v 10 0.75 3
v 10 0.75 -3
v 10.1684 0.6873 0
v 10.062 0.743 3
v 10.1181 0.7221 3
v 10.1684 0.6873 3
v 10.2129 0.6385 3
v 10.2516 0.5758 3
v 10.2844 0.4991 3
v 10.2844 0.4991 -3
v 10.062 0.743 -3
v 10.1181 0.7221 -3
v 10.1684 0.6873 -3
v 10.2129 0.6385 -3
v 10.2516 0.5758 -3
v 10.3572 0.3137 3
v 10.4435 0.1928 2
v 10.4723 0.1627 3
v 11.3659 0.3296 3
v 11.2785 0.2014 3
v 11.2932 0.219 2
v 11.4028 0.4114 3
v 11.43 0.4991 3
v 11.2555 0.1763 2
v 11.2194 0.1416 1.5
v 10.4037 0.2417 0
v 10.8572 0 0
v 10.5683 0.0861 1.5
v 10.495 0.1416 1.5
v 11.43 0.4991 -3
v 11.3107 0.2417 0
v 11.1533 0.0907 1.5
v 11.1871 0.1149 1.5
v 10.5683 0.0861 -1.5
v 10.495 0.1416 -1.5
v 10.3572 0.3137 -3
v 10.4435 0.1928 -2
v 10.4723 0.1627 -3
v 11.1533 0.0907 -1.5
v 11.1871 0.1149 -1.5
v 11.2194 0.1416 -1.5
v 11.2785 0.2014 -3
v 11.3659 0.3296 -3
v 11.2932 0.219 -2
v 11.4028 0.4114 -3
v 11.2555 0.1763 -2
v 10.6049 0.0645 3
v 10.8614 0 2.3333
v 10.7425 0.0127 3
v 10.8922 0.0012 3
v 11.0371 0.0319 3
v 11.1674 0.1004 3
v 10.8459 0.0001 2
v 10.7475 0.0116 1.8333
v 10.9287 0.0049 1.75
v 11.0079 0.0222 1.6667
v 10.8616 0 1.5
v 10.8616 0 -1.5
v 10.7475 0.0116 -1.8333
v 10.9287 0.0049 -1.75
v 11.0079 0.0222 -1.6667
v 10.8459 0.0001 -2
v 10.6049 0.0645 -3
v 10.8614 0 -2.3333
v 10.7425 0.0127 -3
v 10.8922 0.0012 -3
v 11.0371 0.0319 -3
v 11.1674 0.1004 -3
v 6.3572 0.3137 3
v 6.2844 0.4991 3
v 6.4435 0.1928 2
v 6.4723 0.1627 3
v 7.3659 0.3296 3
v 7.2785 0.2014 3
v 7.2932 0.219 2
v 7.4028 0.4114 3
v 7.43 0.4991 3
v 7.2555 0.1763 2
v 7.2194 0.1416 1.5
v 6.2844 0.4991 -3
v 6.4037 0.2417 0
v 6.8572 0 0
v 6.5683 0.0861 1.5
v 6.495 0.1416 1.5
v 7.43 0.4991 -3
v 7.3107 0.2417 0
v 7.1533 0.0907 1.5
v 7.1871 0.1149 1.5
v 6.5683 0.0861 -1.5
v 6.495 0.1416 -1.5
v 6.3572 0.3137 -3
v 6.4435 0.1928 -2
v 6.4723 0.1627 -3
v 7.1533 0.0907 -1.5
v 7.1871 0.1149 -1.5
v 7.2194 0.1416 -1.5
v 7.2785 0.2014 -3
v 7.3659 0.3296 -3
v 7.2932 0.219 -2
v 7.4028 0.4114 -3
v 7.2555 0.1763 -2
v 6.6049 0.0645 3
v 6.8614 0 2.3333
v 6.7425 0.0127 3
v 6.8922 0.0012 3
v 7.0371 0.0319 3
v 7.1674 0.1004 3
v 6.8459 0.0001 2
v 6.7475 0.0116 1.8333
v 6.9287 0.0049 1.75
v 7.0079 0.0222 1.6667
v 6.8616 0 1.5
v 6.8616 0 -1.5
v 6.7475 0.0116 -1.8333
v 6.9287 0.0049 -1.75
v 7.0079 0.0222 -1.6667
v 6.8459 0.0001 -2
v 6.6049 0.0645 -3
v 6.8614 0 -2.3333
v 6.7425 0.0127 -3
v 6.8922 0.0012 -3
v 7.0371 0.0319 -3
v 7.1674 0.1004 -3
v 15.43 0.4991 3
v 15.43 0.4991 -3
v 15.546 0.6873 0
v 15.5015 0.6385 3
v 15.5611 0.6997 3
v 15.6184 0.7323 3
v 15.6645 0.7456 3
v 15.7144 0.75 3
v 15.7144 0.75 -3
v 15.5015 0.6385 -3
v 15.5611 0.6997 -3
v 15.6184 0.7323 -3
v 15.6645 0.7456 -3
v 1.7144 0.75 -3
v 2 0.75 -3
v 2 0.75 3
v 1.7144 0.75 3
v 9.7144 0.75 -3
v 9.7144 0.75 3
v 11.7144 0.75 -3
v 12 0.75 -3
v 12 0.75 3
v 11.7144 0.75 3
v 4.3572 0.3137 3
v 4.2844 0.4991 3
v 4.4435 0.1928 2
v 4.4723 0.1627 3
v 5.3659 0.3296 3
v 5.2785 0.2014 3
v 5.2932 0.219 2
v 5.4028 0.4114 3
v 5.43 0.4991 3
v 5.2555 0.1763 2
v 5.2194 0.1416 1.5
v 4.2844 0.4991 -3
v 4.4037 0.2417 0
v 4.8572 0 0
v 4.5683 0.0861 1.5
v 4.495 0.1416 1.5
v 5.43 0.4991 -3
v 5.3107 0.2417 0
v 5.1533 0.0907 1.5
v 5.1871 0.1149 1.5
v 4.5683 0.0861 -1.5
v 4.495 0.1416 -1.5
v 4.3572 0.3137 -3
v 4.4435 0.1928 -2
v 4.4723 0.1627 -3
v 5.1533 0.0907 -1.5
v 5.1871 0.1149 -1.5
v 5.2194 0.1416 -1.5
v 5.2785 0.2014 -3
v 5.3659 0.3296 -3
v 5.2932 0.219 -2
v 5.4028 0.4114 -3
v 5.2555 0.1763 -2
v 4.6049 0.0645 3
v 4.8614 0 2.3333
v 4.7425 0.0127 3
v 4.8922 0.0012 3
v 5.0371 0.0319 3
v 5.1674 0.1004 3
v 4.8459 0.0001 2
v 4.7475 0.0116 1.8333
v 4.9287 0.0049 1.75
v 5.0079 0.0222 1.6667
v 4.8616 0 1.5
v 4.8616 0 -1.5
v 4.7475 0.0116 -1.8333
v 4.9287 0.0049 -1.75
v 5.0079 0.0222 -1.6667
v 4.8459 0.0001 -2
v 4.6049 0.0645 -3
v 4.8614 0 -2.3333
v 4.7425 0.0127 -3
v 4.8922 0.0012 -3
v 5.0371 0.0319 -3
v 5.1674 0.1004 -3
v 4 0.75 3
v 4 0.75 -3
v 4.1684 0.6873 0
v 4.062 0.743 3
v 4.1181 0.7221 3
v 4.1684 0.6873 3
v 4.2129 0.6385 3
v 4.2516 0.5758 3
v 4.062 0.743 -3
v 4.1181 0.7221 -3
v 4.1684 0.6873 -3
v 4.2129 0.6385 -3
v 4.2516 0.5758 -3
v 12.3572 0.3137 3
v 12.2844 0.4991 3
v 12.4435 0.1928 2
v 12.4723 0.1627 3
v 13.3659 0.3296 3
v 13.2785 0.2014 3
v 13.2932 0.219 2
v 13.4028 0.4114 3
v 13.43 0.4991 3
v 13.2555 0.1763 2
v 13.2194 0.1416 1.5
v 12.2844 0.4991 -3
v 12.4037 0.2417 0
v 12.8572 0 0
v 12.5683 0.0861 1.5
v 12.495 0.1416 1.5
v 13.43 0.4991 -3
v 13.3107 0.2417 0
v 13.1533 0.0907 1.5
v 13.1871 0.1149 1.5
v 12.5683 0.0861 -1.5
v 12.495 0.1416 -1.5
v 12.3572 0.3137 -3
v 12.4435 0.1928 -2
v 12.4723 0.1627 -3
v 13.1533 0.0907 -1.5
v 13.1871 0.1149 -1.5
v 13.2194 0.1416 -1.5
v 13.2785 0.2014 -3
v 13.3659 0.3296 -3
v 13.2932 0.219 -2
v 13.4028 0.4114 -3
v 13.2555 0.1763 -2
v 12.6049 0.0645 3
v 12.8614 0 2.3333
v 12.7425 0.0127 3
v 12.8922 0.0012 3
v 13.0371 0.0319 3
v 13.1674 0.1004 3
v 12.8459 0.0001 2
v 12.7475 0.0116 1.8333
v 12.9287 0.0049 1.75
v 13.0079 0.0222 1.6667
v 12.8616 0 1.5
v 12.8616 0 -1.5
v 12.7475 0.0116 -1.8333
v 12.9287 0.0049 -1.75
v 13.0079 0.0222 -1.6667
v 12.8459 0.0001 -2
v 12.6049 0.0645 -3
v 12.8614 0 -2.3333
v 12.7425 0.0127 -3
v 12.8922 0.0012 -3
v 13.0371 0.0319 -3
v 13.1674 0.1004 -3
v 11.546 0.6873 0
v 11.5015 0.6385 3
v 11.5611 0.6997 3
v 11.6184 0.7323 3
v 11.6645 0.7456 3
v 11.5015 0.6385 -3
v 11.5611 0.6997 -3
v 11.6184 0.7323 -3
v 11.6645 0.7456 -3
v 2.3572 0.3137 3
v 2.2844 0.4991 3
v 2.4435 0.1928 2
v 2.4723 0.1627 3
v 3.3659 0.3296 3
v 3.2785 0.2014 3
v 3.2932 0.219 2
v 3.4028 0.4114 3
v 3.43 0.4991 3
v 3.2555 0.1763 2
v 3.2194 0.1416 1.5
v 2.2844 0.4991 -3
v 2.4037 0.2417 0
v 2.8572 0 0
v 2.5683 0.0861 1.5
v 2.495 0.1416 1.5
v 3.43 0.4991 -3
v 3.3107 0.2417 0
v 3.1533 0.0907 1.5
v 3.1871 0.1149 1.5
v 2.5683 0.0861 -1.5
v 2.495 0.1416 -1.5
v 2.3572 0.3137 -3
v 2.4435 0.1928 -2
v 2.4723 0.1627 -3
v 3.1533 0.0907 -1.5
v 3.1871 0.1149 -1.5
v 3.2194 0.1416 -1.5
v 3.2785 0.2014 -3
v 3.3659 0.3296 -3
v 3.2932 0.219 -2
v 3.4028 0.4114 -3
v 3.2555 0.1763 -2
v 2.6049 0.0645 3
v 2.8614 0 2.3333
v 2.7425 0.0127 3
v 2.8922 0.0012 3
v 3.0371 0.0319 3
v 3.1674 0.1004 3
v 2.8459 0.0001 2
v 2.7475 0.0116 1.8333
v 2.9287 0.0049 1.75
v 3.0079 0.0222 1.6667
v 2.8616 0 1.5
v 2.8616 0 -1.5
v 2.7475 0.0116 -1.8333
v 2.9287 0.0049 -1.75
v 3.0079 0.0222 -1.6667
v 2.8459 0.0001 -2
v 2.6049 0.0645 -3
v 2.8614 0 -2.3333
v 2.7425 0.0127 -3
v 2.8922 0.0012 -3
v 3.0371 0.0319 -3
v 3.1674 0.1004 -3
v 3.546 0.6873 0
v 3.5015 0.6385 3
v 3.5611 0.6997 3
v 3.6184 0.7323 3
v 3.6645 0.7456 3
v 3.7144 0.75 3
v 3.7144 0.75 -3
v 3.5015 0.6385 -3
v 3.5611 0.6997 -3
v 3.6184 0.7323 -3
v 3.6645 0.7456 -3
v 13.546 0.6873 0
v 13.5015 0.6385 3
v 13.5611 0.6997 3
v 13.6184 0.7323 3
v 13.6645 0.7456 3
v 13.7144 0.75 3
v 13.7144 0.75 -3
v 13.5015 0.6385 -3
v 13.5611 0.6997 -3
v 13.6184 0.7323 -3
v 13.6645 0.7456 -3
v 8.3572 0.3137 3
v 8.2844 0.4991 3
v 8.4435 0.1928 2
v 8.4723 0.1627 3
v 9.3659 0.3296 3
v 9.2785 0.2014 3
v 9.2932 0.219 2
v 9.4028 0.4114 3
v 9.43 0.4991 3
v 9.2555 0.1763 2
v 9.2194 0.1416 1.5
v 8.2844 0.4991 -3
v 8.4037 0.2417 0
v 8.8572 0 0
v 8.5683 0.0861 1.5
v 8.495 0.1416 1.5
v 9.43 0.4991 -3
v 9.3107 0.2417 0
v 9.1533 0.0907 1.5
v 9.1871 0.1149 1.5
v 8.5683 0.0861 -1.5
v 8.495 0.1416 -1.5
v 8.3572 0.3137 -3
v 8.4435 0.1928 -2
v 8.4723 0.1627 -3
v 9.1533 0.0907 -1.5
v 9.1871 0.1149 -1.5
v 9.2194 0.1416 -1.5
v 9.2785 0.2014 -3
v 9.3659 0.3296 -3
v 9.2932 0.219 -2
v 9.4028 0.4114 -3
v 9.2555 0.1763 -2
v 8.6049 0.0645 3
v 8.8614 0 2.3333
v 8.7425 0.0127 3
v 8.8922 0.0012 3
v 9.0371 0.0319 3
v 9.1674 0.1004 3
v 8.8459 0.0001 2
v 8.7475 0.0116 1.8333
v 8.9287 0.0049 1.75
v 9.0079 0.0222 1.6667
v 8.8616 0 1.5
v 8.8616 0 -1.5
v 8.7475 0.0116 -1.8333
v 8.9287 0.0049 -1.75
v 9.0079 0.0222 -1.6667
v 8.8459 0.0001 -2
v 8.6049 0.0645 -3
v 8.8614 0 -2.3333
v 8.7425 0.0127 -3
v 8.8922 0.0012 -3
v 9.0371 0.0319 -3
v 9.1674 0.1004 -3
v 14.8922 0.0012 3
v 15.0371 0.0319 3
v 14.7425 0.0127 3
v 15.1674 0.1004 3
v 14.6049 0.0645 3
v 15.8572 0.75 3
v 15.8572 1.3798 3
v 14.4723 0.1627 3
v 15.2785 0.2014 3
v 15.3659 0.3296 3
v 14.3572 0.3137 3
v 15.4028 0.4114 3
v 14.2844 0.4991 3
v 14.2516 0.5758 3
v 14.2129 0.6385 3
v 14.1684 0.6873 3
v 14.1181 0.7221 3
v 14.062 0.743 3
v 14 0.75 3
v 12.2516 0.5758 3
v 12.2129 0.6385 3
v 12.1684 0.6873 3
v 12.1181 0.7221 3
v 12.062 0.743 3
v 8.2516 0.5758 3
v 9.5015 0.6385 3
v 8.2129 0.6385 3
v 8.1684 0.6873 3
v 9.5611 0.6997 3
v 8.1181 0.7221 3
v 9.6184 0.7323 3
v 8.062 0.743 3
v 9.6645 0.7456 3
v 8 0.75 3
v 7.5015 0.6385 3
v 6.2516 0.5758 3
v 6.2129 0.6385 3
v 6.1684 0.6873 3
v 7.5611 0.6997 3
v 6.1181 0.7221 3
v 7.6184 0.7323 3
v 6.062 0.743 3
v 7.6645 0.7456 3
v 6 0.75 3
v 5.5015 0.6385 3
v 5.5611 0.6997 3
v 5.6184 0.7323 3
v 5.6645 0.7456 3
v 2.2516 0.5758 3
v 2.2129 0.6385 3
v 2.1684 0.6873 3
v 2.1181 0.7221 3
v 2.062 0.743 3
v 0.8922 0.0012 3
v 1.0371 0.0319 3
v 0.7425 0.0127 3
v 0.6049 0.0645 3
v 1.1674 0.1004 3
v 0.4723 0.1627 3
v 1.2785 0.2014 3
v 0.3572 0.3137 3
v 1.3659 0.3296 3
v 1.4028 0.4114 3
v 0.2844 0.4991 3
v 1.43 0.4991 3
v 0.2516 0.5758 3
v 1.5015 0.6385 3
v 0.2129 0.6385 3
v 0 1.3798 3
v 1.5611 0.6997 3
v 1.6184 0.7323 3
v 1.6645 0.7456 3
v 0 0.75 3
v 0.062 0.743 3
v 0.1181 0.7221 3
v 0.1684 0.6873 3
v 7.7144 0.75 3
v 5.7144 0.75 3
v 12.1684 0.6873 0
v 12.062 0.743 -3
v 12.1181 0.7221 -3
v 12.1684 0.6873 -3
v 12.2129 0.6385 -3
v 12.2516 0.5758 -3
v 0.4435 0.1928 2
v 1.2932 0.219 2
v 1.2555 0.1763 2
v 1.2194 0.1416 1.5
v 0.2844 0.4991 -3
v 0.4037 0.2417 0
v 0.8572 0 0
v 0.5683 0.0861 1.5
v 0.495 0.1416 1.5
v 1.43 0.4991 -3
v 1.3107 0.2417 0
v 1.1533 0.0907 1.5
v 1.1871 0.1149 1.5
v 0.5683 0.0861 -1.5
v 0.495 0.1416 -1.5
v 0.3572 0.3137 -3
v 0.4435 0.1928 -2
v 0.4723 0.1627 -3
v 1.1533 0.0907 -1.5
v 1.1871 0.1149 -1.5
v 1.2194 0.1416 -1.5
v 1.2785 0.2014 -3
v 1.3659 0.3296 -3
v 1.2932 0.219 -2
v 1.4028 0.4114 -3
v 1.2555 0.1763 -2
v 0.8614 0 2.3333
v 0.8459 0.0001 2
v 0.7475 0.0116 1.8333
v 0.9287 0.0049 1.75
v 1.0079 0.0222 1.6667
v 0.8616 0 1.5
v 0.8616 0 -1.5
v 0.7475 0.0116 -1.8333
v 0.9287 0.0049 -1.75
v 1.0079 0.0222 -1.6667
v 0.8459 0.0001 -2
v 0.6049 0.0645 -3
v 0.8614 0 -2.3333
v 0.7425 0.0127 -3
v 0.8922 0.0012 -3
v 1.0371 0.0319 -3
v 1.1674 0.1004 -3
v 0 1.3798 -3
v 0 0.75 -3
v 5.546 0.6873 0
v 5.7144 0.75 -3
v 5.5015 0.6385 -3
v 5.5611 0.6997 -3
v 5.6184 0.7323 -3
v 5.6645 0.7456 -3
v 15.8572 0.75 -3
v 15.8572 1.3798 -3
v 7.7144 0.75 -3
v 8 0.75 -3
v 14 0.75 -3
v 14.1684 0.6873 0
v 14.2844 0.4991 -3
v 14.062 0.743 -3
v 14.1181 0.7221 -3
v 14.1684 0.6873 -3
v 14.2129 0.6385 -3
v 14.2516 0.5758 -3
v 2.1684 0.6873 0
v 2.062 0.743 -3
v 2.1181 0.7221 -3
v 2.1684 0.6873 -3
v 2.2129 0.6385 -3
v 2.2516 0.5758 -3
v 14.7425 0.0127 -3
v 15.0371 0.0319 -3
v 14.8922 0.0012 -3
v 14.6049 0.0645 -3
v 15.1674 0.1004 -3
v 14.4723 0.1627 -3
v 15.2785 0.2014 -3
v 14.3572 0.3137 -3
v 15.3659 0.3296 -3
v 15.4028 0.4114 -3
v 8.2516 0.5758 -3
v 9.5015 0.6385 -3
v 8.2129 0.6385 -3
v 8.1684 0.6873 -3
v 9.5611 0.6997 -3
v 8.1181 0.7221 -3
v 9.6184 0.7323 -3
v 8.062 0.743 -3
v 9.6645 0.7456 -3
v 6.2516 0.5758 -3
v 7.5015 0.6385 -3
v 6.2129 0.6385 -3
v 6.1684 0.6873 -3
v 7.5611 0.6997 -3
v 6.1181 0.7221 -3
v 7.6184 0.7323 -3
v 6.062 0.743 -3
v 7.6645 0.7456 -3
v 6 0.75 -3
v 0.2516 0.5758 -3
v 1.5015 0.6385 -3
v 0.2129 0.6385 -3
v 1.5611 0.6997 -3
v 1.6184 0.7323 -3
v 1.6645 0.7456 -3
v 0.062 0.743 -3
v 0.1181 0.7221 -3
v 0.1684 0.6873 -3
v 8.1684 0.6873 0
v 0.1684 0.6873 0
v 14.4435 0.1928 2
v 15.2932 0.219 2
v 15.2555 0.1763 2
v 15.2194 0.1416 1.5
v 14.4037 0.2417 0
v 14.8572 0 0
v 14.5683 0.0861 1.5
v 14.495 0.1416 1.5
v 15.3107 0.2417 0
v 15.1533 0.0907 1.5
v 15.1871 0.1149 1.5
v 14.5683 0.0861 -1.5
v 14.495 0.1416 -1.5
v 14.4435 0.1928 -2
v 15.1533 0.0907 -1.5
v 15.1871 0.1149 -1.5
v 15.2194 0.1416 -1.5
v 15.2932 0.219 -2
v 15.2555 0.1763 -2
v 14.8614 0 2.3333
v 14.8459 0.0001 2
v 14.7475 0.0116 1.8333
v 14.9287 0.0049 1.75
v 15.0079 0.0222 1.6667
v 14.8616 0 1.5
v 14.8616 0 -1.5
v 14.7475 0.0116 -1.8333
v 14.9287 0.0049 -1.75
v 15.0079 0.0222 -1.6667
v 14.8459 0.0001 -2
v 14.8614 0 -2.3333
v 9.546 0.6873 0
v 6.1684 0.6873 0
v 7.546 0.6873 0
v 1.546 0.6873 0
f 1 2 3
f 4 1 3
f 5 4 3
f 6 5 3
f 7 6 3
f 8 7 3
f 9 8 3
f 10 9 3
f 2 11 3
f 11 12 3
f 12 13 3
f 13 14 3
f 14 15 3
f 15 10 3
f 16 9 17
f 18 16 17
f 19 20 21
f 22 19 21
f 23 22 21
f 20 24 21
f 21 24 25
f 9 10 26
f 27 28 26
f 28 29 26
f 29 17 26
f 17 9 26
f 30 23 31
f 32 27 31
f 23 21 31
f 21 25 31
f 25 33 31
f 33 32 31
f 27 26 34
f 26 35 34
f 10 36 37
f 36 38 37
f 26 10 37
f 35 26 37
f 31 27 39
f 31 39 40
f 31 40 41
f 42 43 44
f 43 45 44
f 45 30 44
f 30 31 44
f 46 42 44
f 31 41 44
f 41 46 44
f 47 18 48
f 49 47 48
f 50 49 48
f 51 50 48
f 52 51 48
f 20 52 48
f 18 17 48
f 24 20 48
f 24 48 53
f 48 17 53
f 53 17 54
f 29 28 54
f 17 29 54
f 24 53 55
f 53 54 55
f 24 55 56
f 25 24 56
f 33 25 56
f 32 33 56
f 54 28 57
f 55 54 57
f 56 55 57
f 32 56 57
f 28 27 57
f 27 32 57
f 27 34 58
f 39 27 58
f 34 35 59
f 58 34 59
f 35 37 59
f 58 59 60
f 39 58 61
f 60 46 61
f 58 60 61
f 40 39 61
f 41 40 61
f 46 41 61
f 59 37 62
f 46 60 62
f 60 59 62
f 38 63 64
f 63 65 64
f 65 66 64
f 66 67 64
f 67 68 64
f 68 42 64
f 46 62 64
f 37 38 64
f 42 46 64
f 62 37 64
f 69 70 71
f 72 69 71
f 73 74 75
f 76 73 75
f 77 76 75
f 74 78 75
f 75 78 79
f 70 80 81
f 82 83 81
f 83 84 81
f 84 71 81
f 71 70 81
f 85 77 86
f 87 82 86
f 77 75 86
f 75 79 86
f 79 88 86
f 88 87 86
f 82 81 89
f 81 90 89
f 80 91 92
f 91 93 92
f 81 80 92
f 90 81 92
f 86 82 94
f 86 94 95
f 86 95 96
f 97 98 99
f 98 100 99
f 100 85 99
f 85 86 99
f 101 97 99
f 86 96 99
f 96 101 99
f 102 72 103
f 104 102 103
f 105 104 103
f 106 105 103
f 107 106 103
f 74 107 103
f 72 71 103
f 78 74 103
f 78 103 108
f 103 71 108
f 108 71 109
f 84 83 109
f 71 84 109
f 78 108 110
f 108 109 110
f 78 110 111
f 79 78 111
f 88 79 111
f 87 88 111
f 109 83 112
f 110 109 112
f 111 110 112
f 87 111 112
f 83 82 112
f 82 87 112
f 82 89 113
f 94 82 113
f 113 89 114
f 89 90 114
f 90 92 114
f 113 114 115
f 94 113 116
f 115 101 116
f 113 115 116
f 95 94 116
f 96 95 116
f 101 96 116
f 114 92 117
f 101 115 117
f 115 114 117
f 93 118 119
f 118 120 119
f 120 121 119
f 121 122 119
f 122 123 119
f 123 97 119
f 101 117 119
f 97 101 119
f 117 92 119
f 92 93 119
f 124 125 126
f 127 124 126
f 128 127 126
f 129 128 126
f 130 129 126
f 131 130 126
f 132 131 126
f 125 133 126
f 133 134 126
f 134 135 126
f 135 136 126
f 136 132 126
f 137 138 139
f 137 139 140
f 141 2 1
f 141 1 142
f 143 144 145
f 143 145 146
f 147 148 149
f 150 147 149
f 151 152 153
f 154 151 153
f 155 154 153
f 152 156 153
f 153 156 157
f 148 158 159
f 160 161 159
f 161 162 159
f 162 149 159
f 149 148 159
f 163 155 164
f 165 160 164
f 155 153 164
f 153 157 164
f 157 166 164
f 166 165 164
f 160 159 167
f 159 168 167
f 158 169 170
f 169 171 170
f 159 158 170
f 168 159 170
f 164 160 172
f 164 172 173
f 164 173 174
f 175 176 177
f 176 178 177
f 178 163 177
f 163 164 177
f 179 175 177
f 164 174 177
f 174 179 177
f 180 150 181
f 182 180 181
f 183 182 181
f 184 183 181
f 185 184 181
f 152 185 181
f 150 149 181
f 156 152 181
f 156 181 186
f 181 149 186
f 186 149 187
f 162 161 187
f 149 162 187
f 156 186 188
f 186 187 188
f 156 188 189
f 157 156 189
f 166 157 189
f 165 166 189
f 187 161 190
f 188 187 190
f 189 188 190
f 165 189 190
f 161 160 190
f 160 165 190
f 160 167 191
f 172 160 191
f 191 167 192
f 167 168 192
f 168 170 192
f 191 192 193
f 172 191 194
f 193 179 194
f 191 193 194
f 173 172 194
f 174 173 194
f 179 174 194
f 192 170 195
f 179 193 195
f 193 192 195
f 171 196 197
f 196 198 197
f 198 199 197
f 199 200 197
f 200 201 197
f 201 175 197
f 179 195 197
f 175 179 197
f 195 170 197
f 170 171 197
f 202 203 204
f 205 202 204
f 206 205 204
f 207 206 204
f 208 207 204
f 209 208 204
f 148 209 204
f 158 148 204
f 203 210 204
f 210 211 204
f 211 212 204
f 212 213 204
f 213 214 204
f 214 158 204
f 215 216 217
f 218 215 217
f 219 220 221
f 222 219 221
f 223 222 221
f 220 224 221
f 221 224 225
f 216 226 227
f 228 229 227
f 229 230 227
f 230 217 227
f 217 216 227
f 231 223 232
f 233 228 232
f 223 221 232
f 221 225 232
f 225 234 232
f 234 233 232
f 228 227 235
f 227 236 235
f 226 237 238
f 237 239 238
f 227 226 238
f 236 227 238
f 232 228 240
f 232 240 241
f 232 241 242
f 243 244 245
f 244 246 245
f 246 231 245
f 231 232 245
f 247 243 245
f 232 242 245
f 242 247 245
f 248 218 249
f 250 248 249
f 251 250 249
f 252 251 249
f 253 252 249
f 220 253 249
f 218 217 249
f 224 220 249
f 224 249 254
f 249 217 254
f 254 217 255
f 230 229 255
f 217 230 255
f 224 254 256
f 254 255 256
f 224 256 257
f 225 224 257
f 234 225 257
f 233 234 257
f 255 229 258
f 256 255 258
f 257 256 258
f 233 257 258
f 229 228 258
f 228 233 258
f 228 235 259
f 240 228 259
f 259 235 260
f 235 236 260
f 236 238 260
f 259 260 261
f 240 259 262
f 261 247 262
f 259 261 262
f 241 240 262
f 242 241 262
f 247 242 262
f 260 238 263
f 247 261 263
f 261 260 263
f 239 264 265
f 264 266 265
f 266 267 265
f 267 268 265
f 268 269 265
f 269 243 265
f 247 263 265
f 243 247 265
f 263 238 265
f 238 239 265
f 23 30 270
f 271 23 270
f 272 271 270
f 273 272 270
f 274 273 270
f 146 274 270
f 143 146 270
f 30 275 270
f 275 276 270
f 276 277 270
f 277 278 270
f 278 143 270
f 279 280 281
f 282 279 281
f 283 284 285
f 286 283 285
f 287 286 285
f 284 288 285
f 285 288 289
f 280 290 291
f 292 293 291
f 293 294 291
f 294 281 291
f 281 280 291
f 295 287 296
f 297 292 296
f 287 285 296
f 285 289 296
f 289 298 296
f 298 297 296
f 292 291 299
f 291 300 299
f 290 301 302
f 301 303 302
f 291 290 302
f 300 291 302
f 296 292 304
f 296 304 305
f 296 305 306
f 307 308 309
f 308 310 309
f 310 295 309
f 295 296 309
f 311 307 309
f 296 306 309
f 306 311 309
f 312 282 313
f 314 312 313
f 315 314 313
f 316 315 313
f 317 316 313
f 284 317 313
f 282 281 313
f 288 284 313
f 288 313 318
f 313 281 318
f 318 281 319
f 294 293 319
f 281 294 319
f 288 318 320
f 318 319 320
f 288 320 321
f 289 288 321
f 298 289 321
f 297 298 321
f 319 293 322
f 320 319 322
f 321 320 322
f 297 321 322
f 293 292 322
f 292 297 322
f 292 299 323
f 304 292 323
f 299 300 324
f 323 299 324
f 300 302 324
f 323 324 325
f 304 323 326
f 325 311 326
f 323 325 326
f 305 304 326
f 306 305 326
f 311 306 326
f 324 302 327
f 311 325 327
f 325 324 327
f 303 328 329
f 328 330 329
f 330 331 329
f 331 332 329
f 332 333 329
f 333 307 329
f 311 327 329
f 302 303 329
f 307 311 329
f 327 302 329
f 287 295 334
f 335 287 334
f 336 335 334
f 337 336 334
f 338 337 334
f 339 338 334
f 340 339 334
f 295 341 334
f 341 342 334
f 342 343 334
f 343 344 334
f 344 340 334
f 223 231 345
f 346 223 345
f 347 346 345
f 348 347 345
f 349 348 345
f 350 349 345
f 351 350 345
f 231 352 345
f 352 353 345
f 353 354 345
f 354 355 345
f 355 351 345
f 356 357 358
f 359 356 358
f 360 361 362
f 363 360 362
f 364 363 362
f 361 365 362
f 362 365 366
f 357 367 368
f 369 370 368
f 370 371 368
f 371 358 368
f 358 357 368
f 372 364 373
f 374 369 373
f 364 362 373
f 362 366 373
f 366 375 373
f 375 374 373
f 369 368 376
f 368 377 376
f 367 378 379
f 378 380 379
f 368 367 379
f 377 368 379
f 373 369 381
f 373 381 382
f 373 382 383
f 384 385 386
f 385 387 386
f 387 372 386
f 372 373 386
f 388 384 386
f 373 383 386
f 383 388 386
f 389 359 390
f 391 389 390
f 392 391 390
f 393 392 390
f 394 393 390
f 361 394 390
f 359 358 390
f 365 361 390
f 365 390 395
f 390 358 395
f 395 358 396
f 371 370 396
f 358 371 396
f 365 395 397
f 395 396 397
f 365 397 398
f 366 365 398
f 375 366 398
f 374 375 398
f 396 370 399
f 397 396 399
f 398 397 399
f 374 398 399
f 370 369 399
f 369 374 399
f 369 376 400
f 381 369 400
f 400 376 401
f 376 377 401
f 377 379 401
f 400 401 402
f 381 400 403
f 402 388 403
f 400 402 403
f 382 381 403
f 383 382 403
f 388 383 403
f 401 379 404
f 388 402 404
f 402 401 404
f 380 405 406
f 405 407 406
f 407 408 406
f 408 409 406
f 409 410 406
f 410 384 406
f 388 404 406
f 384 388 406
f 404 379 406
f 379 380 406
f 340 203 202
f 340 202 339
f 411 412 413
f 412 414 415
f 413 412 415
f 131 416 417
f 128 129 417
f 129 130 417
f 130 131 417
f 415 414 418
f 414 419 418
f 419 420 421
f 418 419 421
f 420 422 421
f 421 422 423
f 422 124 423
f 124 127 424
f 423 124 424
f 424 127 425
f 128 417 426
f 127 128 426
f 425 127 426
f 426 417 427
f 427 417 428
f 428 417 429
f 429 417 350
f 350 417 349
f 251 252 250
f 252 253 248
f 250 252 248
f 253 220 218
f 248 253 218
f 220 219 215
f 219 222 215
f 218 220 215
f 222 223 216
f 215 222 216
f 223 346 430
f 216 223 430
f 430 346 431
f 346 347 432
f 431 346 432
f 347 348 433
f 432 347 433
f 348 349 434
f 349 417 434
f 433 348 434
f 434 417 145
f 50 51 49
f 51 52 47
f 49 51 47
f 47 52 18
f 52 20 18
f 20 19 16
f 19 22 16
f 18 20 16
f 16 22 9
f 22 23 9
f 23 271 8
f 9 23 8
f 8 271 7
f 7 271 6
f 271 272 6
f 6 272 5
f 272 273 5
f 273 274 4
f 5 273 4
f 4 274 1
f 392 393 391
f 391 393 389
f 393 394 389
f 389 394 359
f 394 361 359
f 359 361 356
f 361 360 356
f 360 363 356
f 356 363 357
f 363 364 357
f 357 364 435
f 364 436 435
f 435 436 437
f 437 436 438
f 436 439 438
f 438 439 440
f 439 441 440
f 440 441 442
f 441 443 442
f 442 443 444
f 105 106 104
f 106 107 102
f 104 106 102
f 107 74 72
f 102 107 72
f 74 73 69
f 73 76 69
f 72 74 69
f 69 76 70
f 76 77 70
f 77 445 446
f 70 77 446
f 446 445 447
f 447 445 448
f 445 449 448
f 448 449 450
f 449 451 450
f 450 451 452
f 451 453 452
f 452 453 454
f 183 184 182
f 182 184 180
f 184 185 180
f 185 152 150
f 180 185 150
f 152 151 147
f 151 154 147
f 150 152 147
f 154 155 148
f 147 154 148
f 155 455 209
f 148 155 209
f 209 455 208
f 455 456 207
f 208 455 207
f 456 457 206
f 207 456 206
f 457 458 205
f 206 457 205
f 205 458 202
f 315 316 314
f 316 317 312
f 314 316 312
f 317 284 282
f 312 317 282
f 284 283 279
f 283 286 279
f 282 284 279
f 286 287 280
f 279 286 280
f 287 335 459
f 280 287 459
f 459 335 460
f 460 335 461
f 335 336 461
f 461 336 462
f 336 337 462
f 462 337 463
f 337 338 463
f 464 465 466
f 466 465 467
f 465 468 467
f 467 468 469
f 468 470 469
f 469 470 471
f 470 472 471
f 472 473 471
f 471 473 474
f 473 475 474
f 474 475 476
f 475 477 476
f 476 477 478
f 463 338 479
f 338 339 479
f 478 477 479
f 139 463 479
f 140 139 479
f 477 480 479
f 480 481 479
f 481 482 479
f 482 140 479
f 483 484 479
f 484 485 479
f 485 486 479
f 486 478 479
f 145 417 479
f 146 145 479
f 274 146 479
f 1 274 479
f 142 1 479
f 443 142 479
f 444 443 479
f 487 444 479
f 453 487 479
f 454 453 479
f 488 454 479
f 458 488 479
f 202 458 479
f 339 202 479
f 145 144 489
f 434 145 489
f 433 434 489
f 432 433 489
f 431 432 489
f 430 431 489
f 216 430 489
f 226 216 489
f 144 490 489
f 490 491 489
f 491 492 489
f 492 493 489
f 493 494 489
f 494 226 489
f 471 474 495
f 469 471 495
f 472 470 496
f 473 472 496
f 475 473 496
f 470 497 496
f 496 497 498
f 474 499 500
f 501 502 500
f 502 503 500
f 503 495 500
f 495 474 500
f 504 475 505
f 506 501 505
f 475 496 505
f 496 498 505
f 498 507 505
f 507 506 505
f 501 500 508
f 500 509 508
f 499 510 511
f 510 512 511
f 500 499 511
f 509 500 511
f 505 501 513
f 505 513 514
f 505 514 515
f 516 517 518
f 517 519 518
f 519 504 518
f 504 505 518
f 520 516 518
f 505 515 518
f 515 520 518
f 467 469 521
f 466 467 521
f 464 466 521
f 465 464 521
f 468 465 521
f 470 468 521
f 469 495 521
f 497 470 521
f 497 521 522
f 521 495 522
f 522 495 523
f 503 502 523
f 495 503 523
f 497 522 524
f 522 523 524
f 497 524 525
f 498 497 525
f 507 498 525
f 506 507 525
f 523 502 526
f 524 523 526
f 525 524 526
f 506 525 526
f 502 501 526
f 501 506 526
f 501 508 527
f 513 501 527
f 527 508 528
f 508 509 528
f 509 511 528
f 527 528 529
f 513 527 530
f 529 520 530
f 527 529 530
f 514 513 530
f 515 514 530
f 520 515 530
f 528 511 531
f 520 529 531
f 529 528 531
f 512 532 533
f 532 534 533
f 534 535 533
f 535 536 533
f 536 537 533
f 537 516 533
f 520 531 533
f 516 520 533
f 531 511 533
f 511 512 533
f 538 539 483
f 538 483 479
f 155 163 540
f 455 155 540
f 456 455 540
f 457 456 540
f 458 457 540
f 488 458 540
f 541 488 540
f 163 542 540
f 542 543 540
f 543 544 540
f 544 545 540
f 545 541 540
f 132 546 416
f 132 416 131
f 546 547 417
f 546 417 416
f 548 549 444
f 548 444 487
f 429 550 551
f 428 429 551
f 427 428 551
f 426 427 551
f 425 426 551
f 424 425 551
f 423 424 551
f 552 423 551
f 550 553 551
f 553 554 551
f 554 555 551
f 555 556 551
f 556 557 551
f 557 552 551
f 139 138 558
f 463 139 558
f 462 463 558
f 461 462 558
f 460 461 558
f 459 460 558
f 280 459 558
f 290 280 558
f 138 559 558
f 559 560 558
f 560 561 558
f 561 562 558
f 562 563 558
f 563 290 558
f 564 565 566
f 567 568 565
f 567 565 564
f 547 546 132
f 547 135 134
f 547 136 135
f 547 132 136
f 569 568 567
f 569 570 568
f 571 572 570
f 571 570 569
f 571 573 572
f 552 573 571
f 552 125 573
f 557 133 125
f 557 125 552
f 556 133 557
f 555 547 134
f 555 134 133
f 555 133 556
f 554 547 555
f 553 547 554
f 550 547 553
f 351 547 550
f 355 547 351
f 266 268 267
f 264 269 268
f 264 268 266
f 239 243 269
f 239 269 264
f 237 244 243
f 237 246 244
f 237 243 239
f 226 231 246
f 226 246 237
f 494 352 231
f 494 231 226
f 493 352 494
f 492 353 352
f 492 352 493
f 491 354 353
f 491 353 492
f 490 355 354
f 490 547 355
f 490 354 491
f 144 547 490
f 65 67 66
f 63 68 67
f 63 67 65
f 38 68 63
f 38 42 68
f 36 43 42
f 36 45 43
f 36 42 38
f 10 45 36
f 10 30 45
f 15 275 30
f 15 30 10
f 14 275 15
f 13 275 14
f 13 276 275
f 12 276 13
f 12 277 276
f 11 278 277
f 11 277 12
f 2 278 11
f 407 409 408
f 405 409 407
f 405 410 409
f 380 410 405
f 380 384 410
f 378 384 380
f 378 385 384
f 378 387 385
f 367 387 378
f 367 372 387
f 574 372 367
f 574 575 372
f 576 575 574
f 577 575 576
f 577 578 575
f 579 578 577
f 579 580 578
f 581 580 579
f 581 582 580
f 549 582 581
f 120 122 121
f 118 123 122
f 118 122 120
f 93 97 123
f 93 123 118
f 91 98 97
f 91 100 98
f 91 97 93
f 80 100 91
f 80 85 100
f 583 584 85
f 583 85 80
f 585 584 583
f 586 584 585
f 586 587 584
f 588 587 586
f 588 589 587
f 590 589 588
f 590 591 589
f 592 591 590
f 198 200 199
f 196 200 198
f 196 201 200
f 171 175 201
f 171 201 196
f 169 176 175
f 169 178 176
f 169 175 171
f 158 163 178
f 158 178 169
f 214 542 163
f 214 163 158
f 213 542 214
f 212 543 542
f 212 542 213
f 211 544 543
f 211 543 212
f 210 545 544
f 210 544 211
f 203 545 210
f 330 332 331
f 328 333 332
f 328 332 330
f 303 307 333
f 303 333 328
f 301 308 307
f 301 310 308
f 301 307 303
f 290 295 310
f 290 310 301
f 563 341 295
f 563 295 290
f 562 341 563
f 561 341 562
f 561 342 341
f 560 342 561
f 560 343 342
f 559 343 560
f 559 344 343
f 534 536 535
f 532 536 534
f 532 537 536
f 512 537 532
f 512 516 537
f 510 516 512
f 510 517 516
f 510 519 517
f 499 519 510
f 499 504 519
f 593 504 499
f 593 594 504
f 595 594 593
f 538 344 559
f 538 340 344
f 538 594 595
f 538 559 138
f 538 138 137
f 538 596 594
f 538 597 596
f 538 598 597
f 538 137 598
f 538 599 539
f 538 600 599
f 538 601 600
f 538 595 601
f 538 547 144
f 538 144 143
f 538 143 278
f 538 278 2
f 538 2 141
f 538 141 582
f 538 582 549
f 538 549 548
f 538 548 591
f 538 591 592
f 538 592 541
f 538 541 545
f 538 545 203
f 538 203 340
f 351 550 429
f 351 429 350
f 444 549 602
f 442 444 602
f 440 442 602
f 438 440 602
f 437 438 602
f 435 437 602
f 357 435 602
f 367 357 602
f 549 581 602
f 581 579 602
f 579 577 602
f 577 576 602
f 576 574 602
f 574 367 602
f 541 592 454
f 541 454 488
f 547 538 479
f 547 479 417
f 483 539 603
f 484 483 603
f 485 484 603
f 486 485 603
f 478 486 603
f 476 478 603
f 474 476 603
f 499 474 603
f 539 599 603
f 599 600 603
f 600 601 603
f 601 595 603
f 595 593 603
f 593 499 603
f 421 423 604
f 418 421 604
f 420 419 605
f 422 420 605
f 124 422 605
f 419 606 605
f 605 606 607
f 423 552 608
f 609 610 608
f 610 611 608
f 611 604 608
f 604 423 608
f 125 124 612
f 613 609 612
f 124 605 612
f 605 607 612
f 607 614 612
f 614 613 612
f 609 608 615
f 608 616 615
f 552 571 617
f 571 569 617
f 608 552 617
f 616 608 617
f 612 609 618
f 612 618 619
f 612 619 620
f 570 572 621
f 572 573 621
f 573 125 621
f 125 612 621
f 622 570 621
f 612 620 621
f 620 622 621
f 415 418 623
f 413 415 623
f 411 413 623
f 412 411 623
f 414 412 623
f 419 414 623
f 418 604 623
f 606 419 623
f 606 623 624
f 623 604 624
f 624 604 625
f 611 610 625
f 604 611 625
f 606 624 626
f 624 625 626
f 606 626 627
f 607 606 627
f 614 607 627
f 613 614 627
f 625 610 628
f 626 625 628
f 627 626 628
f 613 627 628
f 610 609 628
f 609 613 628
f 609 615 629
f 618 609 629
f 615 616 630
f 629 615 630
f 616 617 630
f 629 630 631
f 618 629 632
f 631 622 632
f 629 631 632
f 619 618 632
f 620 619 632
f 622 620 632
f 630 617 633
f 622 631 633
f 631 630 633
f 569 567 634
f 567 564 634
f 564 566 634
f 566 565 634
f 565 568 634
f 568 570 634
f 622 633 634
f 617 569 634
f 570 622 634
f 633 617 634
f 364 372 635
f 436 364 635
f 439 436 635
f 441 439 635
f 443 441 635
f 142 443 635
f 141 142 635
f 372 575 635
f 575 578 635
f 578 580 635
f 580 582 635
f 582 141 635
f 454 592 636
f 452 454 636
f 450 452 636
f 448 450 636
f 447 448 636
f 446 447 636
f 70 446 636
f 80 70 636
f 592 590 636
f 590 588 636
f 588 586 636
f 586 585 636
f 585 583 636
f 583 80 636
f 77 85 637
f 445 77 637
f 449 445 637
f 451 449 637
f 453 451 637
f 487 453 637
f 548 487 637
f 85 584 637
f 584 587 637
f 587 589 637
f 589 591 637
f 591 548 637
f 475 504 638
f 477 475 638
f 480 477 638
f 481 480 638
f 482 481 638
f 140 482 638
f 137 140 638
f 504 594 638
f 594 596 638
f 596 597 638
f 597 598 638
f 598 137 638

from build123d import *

# Parameters (mm, degrees)
BOSS_EXTRUDE1_DEPTH      = 3
BOSS_EXTRUDE1_DEPTH_BACK = 3


with BuildPart() as part:
    # Sketch1 → Boss-Extrude1 (new, two sides: drawn at the far end of the back side and taken through both)
    with BuildSketch(Plane.XY.offset(-BOSS_EXTRUDE1_DEPTH_BACK)):
        with BuildLine():
            Line((0, 0.75), (0, 1.3798))
            Line((0, 1.3798), (3.8572, 1.3798))
            Line((3.8572, 1.3798), (7.8572, 1.3798))
            Line((7.8572, 1.3798), (11.8572, 1.3798))
            Line((11.8572, 1.3798), (15.8572, 1.3798))
            Line((15.8572, 1.3798), (15.8572, 0.75))
            Line((15.8572, 0.75), (15.7144, 0.75))
            add(Edge.make_bspline(
                [(15.43, 0.4991), (15.5198, 0.75), (15.7144, 0.75)],
                knots=[0.872727273, 0.872727273, 0.872727273, 0.890909091, 0.890909091, 0.890909091], degree=2))
            add(Edge.make_bspline(
                [(14.8572, 0), (15.13, 0), (15.3594, 0.2112), (15.43, 0.4991)],
                knots=[0.854545455, 0.854545455, 0.854545455, 0.854545455, 0.872727273, 0.872727273, 0.872727273, 0.872727273], degree=3))
            add(Edge.make_bspline(
                [(14.2844, 0.4991), (14.355, 0.2112), (14.5844, 0), (14.8572, 0)],
                knots=[0.836363636, 0.836363636, 0.836363636, 0.836363636, 0.854545455, 0.854545455, 0.854545455, 0.854545455], degree=3))
            add(Edge.make_bspline(
                [(14, 0.75), (14.1946, 0.75), (14.2844, 0.4991)],
                knots=[0.818181818, 0.818181818, 0.818181818, 0.836363636, 0.836363636, 0.836363636], degree=2))
            Line((14, 0.75), (13.8572, 0.75))
            Line((13.8572, 0.75), (13.7144, 0.75))
            add(Edge.make_bspline(
                [(13.43, 0.4991), (13.5198, 0.75), (13.7144, 0.75)],
                knots=[0.763636364, 0.763636364, 0.763636364, 0.781818182, 0.781818182, 0.781818182], degree=2))
            add(Edge.make_bspline(
                [(12.8572, 0), (13.13, 0), (13.3594, 0.2112), (13.43, 0.4991)],
                knots=[0.745454545, 0.745454545, 0.745454545, 0.745454545, 0.763636364, 0.763636364, 0.763636364, 0.763636364], degree=3))
            add(Edge.make_bspline(
                [(12.2844, 0.4991), (12.355, 0.2112), (12.5844, 0), (12.8572, 0)],
                knots=[0.727272727, 0.727272727, 0.727272727, 0.727272727, 0.745454545, 0.745454545, 0.745454545, 0.745454545], degree=3))
            add(Edge.make_bspline(
                [(12, 0.75), (12.1946, 0.75), (12.2844, 0.4991)],
                knots=[0.709090909, 0.709090909, 0.709090909, 0.727272727, 0.727272727, 0.727272727], degree=2))
            Line((12, 0.75), (11.8572, 0.75))
            Line((11.8572, 0.75), (11.7144, 0.75))
            add(Edge.make_bspline(
                [(11.43, 0.4991), (11.5198, 0.75), (11.7144, 0.75)],
                knots=[0.654545455, 0.654545455, 0.654545455, 0.672727273, 0.672727273, 0.672727273], degree=2))
            add(Edge.make_bspline(
                [(10.8572, 0), (11.13, 0), (11.3594, 0.2112), (11.43, 0.4991)],
                knots=[0.636363636, 0.636363636, 0.636363636, 0.636363636, 0.654545455, 0.654545455, 0.654545455, 0.654545455], degree=3))
            add(Edge.make_bspline(
                [(10.2844, 0.4991), (10.355, 0.2112), (10.5844, 0), (10.8572, 0)],
                knots=[0.618181818, 0.618181818, 0.618181818, 0.618181818, 0.636363636, 0.636363636, 0.636363636, 0.636363636], degree=3))
            add(Edge.make_bspline(
                [(10, 0.75), (10.1946, 0.75), (10.2844, 0.4991)],
                knots=[0.6, 0.6, 0.6, 0.618181818, 0.618181818, 0.618181818], degree=2))
            Line((10, 0.75), (9.8572, 0.75))
            Line((9.8572, 0.75), (9.7144, 0.75))
            add(Edge.make_bspline(
                [(9.43, 0.4991), (9.5198, 0.75), (9.7144, 0.75)],
                knots=[0.545454545, 0.545454545, 0.545454545, 0.563636364, 0.563636364, 0.563636364], degree=2))
            add(Edge.make_bspline(
                [(8.8572, 0), (9.13, 0), (9.3594, 0.2112), (9.43, 0.4991)],
                knots=[0.527272727, 0.527272727, 0.527272727, 0.527272727, 0.545454545, 0.545454545, 0.545454545, 0.545454545], degree=3))
            add(Edge.make_bspline(
                [(8.2844, 0.4991), (8.355, 0.2112), (8.5844, 0), (8.8572, 0)],
                knots=[0.509090909, 0.509090909, 0.509090909, 0.509090909, 0.527272727, 0.527272727, 0.527272727, 0.527272727], degree=3))
            add(Edge.make_bspline(
                [(8, 0.75), (8.1946, 0.75), (8.2844, 0.4991)],
                knots=[0.490909091, 0.490909091, 0.490909091, 0.509090909, 0.509090909, 0.509090909], degree=2))
            Line((8, 0.75), (7.8572, 0.75))
            Line((7.8572, 0.75), (7.7144, 0.75))
            add(Edge.make_bspline(
                [(7.43, 0.4991), (7.5198, 0.75), (7.7144, 0.75)],
                knots=[0.436363636, 0.436363636, 0.436363636, 0.454545455, 0.454545455, 0.454545455], degree=2))
            add(Edge.make_bspline(
                [(6.8572, 0), (7.13, 0), (7.3594, 0.2112), (7.43, 0.4991)],
                knots=[0.418181818, 0.418181818, 0.418181818, 0.418181818, 0.436363636, 0.436363636, 0.436363636, 0.436363636], degree=3))
            add(Edge.make_bspline(
                [(6.2844, 0.4991), (6.355, 0.2112), (6.5844, 0), (6.8572, 0)],
                knots=[0.4, 0.4, 0.4, 0.4, 0.418181818, 0.418181818, 0.418181818, 0.418181818], degree=3))
            add(Edge.make_bspline(
                [(6, 0.75), (6.1946, 0.75), (6.2844, 0.4991)],
                knots=[0.381818182, 0.381818182, 0.381818182, 0.4, 0.4, 0.4], degree=2))
            Line((6, 0.75), (5.8572, 0.75))
            Line((5.8572, 0.75), (5.7144, 0.75))
            add(Edge.make_bspline(
                [(5.43, 0.4991), (5.5198, 0.75), (5.7144, 0.75)],
                knots=[0.327272727, 0.327272727, 0.327272727, 0.345454545, 0.345454545, 0.345454545], degree=2))
            add(Edge.make_bspline(
                [(4.8572, 0), (5.13, 0), (5.3594, 0.2112), (5.43, 0.4991)],
                knots=[0.309090909, 0.309090909, 0.309090909, 0.309090909, 0.327272727, 0.327272727, 0.327272727, 0.327272727], degree=3))
            add(Edge.make_bspline(
                [(4.2844, 0.4991), (4.355, 0.2112), (4.5844, 0), (4.8572, 0)],
                knots=[0.290909091, 0.290909091, 0.290909091, 0.290909091, 0.309090909, 0.309090909, 0.309090909, 0.309090909], degree=3))
            add(Edge.make_bspline(
                [(4, 0.75), (4.1946, 0.75), (4.2844, 0.4991)],
                knots=[0.272727273, 0.272727273, 0.272727273, 0.290909091, 0.290909091, 0.290909091], degree=2))
            Line((4, 0.75), (3.8572, 0.75))
            Line((3.8572, 0.75), (3.7144, 0.75))
            add(Edge.make_bspline(
                [(3.43, 0.4991), (3.5198, 0.75), (3.7144, 0.75)],
                knots=[0.218181818, 0.218181818, 0.218181818, 0.236363636, 0.236363636, 0.236363636], degree=2))
            add(Edge.make_bspline(
                [(2.8572, 0), (3.13, 0), (3.3594, 0.2112), (3.43, 0.4991)],
                knots=[0.2, 0.2, 0.2, 0.2, 0.218181818, 0.218181818, 0.218181818, 0.218181818], degree=3))
            add(Edge.make_bspline(
                [(2.2844, 0.4991), (2.355, 0.2112), (2.5844, 0), (2.8572, 0)],
                knots=[0.181818182, 0.181818182, 0.181818182, 0.181818182, 0.2, 0.2, 0.2, 0.2], degree=3))
            add(Edge.make_bspline(
                [(2, 0.75), (2.1946, 0.75), (2.2844, 0.4991)],
                knots=[0.163636364, 0.163636364, 0.163636364, 0.181818182, 0.181818182, 0.181818182], degree=2))
            Line((2, 0.75), (1.8572, 0.75))
            Line((1.8572, 0.75), (1.7144, 0.75))
            add(Edge.make_bspline(
                [(1.43, 0.4991), (1.5198, 0.75), (1.7144, 0.75)],
                knots=[0.109090909, 0.109090909, 0.109090909, 0.127272727, 0.127272727, 0.127272727], degree=2))
            add(Edge.make_bspline(
                [(0.8572, 0), (1.13, 0), (1.3594, 0.2112), (1.43, 0.4991)],
                knots=[0.090909091, 0.090909091, 0.090909091, 0.090909091, 0.109090909, 0.109090909, 0.109090909, 0.109090909], degree=3))
            add(Edge.make_bspline(
                [(0.2844, 0.4991), (0.355, 0.2112), (0.5844, 0), (0.8572, 0)],
                knots=[0.072727273, 0.072727273, 0.072727273, 0.072727273, 0.090909091, 0.090909091, 0.090909091, 0.090909091], degree=3))
            add(Edge.make_bspline(
                [(0, 0.75), (0.1946, 0.75), (0.2844, 0.4991)],
                knots=[0.054545455, 0.054545455, 0.054545455, 0.072727273, 0.072727273, 0.072727273], degree=2))
        make_face()
    extrude(amount=BOSS_EXTRUDE1_DEPTH + BOSS_EXTRUDE1_DEPTH_BACK)


solid = part.part
